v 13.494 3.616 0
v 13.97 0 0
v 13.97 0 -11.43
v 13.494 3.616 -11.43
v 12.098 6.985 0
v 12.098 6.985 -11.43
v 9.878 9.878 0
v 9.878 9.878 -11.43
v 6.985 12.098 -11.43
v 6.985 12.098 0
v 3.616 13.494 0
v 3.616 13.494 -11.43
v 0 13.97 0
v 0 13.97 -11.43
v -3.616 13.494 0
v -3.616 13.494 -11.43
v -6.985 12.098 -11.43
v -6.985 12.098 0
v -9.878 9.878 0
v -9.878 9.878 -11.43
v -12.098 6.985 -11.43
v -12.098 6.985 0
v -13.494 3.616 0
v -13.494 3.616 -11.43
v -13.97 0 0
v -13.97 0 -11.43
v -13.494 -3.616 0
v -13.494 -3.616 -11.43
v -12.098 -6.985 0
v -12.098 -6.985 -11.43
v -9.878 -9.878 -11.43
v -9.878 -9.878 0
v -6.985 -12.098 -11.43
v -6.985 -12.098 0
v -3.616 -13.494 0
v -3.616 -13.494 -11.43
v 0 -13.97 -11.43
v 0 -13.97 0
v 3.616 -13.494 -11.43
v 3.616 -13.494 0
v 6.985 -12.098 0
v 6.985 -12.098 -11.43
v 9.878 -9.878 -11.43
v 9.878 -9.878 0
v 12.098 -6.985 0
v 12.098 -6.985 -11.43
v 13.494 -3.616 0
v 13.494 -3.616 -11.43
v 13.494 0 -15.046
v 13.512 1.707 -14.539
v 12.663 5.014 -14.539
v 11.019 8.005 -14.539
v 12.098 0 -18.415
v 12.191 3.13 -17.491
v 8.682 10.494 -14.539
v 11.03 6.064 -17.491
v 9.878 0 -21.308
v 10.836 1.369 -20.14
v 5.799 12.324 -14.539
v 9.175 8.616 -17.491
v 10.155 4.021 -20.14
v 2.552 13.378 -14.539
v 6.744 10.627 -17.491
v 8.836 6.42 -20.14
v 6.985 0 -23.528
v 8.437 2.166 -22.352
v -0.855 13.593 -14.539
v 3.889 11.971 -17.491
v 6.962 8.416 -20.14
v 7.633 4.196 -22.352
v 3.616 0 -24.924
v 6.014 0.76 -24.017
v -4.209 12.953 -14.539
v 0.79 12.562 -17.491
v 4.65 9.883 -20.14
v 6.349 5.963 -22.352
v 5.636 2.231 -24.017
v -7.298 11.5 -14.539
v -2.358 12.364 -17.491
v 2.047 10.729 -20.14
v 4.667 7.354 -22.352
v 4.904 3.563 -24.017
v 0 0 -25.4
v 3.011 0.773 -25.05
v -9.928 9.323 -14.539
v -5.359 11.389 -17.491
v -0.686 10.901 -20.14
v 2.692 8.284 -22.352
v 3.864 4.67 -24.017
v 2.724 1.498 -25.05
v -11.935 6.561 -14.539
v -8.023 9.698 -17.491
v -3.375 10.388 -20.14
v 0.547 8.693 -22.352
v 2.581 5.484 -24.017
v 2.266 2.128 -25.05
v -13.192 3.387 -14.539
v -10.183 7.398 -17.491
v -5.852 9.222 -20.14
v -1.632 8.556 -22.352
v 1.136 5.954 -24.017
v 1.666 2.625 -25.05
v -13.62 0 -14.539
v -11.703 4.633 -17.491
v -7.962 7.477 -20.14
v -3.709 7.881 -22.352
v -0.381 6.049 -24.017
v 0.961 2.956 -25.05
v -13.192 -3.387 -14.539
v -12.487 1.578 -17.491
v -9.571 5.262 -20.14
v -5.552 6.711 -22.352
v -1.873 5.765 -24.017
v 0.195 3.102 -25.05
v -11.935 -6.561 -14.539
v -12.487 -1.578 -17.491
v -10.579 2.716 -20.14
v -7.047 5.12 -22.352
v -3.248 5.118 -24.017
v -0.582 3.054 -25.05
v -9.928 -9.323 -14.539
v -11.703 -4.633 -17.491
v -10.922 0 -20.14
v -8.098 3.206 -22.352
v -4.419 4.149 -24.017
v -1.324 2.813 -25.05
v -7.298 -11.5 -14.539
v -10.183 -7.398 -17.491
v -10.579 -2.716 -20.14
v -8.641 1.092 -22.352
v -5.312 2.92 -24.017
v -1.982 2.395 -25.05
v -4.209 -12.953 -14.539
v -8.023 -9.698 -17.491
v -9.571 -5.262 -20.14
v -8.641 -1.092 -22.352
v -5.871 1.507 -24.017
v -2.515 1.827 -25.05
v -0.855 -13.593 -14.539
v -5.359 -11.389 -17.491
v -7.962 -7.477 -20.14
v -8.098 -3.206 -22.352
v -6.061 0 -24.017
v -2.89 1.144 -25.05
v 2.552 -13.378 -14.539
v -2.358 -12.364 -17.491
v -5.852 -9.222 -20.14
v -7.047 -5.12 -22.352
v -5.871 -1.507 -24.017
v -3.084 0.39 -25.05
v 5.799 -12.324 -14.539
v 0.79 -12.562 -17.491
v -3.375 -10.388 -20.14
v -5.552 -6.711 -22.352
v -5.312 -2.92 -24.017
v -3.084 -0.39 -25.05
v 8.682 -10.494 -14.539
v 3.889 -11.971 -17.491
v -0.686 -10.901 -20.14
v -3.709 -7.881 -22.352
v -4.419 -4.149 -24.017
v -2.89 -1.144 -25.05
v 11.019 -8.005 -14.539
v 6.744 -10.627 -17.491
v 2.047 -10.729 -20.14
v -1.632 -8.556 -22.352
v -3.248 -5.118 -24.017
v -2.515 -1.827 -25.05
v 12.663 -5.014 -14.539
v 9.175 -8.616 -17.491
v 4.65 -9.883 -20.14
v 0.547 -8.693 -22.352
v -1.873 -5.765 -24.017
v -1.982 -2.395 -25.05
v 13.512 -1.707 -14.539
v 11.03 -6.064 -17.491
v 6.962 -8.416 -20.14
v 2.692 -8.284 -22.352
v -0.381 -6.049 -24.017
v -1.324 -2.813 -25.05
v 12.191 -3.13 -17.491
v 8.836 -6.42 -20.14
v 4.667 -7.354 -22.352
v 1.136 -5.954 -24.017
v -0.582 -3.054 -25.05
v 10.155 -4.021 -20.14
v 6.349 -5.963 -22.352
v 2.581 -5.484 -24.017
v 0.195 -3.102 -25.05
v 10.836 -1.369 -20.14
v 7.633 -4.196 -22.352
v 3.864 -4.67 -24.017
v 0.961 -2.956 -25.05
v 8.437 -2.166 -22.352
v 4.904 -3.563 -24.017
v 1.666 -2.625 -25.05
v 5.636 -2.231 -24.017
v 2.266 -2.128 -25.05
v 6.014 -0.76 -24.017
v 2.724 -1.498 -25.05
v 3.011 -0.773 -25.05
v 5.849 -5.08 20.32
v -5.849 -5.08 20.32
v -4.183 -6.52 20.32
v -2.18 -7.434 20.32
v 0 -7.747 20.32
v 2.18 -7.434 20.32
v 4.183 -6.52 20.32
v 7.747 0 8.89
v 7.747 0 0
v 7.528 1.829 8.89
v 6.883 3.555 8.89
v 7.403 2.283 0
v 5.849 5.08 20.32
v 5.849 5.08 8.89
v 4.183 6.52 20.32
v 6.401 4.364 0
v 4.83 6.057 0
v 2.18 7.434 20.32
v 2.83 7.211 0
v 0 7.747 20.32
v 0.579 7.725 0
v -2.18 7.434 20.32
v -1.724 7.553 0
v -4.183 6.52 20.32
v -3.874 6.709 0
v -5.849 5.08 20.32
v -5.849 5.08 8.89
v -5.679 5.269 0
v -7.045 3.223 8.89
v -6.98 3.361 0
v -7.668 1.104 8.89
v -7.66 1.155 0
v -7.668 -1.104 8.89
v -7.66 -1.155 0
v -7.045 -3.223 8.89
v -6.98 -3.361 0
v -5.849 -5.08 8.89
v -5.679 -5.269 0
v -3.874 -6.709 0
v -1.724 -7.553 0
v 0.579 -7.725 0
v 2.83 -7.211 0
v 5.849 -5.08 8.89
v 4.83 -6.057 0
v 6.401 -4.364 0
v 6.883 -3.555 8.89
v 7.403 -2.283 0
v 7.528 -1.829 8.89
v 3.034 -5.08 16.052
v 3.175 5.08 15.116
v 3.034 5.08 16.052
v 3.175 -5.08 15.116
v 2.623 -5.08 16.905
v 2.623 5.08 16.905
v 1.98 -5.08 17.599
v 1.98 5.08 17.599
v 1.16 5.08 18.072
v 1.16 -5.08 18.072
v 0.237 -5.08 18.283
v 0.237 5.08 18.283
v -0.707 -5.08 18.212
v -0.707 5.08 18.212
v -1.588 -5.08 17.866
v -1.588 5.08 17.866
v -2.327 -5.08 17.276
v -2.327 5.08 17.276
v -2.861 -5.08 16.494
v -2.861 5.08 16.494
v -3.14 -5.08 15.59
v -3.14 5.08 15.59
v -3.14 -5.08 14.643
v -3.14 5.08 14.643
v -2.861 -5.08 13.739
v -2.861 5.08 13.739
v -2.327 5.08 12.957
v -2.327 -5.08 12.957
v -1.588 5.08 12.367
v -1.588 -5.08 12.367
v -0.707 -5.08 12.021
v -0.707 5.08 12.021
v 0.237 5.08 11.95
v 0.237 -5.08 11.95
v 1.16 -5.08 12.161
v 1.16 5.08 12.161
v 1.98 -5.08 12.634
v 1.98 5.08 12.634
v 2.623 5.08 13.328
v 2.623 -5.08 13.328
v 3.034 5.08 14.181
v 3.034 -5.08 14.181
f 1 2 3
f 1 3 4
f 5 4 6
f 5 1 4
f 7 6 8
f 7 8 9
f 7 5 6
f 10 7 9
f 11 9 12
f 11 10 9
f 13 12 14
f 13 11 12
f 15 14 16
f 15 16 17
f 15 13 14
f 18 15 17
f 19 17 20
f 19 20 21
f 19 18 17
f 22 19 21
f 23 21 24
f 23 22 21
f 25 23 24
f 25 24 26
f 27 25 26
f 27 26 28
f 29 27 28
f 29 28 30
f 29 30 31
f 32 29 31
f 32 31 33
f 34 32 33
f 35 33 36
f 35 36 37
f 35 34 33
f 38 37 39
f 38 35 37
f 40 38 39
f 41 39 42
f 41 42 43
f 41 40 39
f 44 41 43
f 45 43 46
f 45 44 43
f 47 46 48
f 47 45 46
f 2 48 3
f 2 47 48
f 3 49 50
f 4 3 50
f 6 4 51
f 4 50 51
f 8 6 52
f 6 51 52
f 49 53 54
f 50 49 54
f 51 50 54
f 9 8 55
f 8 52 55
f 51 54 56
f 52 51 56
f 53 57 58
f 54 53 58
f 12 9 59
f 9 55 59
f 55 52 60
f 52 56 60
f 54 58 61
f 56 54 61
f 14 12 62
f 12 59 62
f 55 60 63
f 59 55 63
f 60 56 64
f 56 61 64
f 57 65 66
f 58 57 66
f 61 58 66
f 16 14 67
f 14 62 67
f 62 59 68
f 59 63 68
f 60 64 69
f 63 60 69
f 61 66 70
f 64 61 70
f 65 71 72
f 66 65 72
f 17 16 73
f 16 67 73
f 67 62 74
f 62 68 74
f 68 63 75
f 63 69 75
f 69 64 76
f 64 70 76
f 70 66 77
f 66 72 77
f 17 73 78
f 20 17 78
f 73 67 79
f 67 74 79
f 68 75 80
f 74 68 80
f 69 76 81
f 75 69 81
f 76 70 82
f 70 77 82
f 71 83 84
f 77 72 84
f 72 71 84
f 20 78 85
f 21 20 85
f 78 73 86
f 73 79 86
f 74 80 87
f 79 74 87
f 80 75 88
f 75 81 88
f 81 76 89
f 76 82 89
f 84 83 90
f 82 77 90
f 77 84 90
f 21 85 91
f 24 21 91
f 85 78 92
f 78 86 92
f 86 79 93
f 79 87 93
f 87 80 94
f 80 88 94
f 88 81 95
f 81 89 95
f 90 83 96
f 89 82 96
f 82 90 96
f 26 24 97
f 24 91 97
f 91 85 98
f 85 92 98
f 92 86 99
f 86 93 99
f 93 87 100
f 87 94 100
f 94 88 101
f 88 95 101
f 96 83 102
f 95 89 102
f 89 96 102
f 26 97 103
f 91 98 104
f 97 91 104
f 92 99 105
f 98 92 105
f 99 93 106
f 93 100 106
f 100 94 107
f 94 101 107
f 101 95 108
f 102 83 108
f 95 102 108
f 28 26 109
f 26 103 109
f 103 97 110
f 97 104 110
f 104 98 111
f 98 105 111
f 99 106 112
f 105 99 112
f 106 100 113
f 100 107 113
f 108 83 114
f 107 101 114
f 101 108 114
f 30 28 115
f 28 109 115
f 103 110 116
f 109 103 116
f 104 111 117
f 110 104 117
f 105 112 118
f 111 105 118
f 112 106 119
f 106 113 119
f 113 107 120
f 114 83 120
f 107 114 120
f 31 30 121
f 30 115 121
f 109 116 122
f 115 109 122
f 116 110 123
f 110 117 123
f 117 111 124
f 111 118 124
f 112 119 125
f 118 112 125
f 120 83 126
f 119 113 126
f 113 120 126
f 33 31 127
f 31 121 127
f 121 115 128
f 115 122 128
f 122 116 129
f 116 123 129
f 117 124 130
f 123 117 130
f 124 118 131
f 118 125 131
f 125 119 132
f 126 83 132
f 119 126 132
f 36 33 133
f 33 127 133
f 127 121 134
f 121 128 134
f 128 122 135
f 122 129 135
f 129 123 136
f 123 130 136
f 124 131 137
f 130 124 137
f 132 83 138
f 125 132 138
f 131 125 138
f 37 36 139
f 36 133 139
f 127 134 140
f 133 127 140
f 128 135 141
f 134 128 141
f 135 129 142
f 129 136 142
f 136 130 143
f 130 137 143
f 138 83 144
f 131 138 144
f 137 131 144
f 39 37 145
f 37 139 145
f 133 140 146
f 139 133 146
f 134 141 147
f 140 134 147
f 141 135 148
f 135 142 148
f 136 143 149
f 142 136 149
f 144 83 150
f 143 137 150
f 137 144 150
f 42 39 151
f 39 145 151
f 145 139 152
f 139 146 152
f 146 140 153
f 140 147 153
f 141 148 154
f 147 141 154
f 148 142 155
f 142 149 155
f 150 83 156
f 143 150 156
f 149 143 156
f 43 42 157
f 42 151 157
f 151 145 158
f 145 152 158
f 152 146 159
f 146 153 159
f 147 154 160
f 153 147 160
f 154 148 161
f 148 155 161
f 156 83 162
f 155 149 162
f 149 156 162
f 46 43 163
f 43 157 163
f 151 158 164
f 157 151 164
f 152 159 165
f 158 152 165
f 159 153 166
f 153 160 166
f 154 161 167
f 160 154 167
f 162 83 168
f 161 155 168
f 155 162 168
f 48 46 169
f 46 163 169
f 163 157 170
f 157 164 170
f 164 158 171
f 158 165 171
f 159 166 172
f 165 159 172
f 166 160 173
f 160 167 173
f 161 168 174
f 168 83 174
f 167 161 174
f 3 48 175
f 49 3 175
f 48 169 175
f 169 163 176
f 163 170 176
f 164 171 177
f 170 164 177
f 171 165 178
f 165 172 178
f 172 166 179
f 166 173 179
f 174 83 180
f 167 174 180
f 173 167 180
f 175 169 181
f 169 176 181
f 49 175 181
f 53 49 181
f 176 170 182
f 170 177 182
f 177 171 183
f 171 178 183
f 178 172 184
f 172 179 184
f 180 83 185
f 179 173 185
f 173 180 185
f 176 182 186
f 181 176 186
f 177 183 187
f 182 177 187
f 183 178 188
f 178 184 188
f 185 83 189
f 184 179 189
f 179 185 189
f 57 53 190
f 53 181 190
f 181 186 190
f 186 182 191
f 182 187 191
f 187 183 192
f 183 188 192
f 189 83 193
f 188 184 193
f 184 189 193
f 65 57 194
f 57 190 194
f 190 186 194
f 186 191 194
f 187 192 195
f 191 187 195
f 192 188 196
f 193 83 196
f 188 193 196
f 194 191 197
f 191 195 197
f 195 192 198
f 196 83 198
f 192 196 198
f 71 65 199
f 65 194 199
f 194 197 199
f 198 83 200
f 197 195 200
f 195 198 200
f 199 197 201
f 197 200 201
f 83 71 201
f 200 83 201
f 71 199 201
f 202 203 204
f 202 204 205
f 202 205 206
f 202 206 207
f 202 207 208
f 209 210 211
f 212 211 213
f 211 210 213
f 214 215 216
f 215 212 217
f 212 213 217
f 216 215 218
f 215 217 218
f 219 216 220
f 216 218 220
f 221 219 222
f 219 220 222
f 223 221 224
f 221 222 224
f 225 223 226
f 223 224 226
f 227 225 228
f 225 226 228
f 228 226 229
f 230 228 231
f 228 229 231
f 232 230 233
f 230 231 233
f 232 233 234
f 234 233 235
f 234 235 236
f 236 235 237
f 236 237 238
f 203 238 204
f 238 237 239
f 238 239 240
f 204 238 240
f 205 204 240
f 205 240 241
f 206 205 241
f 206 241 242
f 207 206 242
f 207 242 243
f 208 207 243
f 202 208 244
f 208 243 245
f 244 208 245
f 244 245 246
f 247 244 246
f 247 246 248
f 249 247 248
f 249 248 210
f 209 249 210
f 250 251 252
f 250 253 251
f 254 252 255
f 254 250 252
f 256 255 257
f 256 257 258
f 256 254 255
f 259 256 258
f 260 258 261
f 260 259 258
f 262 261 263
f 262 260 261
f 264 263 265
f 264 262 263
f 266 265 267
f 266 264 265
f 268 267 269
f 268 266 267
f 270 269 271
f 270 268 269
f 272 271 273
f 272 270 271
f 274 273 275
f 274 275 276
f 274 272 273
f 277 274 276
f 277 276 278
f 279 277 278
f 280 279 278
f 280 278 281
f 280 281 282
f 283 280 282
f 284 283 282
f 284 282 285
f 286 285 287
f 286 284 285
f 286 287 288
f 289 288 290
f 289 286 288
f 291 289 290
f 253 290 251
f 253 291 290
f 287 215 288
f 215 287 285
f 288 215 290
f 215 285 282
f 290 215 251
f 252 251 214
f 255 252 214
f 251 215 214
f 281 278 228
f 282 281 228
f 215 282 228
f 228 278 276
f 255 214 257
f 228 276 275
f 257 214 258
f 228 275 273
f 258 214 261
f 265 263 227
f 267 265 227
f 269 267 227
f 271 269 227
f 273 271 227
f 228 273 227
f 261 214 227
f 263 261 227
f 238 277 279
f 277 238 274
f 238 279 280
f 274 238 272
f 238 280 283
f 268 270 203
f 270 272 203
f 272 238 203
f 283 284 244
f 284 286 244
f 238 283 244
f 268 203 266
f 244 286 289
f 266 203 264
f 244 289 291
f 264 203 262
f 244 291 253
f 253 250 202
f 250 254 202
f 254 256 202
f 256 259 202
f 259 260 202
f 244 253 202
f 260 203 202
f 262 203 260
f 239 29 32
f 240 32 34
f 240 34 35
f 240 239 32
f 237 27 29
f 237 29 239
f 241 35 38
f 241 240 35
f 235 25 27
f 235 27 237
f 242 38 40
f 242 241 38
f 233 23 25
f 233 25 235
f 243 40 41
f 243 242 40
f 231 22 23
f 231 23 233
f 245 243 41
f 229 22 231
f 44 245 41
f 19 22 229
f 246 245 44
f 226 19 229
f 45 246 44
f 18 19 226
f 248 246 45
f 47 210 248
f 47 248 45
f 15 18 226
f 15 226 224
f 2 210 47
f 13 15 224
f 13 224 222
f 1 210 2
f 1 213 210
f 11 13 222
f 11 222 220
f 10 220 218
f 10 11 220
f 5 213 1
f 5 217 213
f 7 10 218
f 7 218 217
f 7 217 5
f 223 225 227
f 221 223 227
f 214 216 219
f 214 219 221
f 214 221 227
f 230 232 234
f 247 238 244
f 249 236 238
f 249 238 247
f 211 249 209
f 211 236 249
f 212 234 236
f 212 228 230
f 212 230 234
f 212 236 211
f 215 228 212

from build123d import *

# Parameters (mm, degrees)
F0_R     = 7.747
F1_DEPTH = 20.32
F0_R_2   = 13.97
F2_DEPTH = 25.4
F3_R     = 13.97
F5_DEPTH = 11.43
F6_R     = 3.175
F7_DEPTH = 6.35


with BuildPart() as f1:
    # F0 (on Top) → F1 (new body)
    with BuildSketch(Plane.XY):
        Circle(F0_R)
    extrude(amount=F1_DEPTH)

    # F0 (on Top) → F2 (join)
    with BuildSketch(Plane.XY):
        Circle(F0_R_2)
        Circle(F0_R, mode=Mode.SUBTRACT)
        Circle(F0_R)
    extrude(amount=-F2_DEPTH)

    # F3
    f3_edges = [f1.edges().sort_by_distance(p)[0] for p in [
        (-13.97, 0, -25.4),
    ]]
    fillet(f3_edges, radius=F3_R)

    # F4 (on face) → F5 (cut)
    with BuildSketch(Plane.XY.offset(20.32)):
        with BuildLine():
            Line((10.1125147194, 5.08), (5.8488981014, 5.08))
            ThreePointArc((5.8488981014, 5.08), (7.2569767325, 2.7115120698), (7.747, 0))
            ThreePointArc((7.747, 0), (7.2569767325, -2.7115120698), (5.8488981014, -5.08))
            Line((5.8488981014, -5.08), (10.1125147194, -5.08))
            Line((10.1125147194, -5.08), (10.1125147194, 5.08))
        make_face()
        with BuildLine():
            Line((5.8488981014, 5.08), (-5.8488981014, 5.08))
            ThreePointArc((-5.8488981014, 5.08), (-7.747, 0), (-5.8488981014, -5.08))
            Line((-5.8488981014, -5.08), (5.8488981014, -5.08))
            ThreePointArc((5.8488981014, -5.08), (7.2569767325, -2.7115120698), (7.747, 0))
            ThreePointArc((7.747, 0), (7.2569767325, 2.7115120698), (5.8488981014, 5.08))
        make_face()
        with BuildLine():
            Line((-5.8488981014, 5.08), (-9.6324700862, 5.08))
            Line((-9.6324700862, 5.08), (-9.6324700862, -5.08))
            Line((-9.6324700862, -5.08), (-5.8488981014, -5.08))
            ThreePointArc((-5.8488981014, -5.08), (-7.747, 0), (-5.8488981014, 5.08))
        make_face()
    extrude(amount=-F5_DEPTH, mode=Mode.SUBTRACT)

    # F6 (on Front) → F7 (join, symmetric)
    with BuildSketch(Plane.XZ):
        with Locations((0, 15.116378665)):
            Circle(F6_R)
    extrude(amount=F7_DEPTH, both=True)


solid = f1.part
